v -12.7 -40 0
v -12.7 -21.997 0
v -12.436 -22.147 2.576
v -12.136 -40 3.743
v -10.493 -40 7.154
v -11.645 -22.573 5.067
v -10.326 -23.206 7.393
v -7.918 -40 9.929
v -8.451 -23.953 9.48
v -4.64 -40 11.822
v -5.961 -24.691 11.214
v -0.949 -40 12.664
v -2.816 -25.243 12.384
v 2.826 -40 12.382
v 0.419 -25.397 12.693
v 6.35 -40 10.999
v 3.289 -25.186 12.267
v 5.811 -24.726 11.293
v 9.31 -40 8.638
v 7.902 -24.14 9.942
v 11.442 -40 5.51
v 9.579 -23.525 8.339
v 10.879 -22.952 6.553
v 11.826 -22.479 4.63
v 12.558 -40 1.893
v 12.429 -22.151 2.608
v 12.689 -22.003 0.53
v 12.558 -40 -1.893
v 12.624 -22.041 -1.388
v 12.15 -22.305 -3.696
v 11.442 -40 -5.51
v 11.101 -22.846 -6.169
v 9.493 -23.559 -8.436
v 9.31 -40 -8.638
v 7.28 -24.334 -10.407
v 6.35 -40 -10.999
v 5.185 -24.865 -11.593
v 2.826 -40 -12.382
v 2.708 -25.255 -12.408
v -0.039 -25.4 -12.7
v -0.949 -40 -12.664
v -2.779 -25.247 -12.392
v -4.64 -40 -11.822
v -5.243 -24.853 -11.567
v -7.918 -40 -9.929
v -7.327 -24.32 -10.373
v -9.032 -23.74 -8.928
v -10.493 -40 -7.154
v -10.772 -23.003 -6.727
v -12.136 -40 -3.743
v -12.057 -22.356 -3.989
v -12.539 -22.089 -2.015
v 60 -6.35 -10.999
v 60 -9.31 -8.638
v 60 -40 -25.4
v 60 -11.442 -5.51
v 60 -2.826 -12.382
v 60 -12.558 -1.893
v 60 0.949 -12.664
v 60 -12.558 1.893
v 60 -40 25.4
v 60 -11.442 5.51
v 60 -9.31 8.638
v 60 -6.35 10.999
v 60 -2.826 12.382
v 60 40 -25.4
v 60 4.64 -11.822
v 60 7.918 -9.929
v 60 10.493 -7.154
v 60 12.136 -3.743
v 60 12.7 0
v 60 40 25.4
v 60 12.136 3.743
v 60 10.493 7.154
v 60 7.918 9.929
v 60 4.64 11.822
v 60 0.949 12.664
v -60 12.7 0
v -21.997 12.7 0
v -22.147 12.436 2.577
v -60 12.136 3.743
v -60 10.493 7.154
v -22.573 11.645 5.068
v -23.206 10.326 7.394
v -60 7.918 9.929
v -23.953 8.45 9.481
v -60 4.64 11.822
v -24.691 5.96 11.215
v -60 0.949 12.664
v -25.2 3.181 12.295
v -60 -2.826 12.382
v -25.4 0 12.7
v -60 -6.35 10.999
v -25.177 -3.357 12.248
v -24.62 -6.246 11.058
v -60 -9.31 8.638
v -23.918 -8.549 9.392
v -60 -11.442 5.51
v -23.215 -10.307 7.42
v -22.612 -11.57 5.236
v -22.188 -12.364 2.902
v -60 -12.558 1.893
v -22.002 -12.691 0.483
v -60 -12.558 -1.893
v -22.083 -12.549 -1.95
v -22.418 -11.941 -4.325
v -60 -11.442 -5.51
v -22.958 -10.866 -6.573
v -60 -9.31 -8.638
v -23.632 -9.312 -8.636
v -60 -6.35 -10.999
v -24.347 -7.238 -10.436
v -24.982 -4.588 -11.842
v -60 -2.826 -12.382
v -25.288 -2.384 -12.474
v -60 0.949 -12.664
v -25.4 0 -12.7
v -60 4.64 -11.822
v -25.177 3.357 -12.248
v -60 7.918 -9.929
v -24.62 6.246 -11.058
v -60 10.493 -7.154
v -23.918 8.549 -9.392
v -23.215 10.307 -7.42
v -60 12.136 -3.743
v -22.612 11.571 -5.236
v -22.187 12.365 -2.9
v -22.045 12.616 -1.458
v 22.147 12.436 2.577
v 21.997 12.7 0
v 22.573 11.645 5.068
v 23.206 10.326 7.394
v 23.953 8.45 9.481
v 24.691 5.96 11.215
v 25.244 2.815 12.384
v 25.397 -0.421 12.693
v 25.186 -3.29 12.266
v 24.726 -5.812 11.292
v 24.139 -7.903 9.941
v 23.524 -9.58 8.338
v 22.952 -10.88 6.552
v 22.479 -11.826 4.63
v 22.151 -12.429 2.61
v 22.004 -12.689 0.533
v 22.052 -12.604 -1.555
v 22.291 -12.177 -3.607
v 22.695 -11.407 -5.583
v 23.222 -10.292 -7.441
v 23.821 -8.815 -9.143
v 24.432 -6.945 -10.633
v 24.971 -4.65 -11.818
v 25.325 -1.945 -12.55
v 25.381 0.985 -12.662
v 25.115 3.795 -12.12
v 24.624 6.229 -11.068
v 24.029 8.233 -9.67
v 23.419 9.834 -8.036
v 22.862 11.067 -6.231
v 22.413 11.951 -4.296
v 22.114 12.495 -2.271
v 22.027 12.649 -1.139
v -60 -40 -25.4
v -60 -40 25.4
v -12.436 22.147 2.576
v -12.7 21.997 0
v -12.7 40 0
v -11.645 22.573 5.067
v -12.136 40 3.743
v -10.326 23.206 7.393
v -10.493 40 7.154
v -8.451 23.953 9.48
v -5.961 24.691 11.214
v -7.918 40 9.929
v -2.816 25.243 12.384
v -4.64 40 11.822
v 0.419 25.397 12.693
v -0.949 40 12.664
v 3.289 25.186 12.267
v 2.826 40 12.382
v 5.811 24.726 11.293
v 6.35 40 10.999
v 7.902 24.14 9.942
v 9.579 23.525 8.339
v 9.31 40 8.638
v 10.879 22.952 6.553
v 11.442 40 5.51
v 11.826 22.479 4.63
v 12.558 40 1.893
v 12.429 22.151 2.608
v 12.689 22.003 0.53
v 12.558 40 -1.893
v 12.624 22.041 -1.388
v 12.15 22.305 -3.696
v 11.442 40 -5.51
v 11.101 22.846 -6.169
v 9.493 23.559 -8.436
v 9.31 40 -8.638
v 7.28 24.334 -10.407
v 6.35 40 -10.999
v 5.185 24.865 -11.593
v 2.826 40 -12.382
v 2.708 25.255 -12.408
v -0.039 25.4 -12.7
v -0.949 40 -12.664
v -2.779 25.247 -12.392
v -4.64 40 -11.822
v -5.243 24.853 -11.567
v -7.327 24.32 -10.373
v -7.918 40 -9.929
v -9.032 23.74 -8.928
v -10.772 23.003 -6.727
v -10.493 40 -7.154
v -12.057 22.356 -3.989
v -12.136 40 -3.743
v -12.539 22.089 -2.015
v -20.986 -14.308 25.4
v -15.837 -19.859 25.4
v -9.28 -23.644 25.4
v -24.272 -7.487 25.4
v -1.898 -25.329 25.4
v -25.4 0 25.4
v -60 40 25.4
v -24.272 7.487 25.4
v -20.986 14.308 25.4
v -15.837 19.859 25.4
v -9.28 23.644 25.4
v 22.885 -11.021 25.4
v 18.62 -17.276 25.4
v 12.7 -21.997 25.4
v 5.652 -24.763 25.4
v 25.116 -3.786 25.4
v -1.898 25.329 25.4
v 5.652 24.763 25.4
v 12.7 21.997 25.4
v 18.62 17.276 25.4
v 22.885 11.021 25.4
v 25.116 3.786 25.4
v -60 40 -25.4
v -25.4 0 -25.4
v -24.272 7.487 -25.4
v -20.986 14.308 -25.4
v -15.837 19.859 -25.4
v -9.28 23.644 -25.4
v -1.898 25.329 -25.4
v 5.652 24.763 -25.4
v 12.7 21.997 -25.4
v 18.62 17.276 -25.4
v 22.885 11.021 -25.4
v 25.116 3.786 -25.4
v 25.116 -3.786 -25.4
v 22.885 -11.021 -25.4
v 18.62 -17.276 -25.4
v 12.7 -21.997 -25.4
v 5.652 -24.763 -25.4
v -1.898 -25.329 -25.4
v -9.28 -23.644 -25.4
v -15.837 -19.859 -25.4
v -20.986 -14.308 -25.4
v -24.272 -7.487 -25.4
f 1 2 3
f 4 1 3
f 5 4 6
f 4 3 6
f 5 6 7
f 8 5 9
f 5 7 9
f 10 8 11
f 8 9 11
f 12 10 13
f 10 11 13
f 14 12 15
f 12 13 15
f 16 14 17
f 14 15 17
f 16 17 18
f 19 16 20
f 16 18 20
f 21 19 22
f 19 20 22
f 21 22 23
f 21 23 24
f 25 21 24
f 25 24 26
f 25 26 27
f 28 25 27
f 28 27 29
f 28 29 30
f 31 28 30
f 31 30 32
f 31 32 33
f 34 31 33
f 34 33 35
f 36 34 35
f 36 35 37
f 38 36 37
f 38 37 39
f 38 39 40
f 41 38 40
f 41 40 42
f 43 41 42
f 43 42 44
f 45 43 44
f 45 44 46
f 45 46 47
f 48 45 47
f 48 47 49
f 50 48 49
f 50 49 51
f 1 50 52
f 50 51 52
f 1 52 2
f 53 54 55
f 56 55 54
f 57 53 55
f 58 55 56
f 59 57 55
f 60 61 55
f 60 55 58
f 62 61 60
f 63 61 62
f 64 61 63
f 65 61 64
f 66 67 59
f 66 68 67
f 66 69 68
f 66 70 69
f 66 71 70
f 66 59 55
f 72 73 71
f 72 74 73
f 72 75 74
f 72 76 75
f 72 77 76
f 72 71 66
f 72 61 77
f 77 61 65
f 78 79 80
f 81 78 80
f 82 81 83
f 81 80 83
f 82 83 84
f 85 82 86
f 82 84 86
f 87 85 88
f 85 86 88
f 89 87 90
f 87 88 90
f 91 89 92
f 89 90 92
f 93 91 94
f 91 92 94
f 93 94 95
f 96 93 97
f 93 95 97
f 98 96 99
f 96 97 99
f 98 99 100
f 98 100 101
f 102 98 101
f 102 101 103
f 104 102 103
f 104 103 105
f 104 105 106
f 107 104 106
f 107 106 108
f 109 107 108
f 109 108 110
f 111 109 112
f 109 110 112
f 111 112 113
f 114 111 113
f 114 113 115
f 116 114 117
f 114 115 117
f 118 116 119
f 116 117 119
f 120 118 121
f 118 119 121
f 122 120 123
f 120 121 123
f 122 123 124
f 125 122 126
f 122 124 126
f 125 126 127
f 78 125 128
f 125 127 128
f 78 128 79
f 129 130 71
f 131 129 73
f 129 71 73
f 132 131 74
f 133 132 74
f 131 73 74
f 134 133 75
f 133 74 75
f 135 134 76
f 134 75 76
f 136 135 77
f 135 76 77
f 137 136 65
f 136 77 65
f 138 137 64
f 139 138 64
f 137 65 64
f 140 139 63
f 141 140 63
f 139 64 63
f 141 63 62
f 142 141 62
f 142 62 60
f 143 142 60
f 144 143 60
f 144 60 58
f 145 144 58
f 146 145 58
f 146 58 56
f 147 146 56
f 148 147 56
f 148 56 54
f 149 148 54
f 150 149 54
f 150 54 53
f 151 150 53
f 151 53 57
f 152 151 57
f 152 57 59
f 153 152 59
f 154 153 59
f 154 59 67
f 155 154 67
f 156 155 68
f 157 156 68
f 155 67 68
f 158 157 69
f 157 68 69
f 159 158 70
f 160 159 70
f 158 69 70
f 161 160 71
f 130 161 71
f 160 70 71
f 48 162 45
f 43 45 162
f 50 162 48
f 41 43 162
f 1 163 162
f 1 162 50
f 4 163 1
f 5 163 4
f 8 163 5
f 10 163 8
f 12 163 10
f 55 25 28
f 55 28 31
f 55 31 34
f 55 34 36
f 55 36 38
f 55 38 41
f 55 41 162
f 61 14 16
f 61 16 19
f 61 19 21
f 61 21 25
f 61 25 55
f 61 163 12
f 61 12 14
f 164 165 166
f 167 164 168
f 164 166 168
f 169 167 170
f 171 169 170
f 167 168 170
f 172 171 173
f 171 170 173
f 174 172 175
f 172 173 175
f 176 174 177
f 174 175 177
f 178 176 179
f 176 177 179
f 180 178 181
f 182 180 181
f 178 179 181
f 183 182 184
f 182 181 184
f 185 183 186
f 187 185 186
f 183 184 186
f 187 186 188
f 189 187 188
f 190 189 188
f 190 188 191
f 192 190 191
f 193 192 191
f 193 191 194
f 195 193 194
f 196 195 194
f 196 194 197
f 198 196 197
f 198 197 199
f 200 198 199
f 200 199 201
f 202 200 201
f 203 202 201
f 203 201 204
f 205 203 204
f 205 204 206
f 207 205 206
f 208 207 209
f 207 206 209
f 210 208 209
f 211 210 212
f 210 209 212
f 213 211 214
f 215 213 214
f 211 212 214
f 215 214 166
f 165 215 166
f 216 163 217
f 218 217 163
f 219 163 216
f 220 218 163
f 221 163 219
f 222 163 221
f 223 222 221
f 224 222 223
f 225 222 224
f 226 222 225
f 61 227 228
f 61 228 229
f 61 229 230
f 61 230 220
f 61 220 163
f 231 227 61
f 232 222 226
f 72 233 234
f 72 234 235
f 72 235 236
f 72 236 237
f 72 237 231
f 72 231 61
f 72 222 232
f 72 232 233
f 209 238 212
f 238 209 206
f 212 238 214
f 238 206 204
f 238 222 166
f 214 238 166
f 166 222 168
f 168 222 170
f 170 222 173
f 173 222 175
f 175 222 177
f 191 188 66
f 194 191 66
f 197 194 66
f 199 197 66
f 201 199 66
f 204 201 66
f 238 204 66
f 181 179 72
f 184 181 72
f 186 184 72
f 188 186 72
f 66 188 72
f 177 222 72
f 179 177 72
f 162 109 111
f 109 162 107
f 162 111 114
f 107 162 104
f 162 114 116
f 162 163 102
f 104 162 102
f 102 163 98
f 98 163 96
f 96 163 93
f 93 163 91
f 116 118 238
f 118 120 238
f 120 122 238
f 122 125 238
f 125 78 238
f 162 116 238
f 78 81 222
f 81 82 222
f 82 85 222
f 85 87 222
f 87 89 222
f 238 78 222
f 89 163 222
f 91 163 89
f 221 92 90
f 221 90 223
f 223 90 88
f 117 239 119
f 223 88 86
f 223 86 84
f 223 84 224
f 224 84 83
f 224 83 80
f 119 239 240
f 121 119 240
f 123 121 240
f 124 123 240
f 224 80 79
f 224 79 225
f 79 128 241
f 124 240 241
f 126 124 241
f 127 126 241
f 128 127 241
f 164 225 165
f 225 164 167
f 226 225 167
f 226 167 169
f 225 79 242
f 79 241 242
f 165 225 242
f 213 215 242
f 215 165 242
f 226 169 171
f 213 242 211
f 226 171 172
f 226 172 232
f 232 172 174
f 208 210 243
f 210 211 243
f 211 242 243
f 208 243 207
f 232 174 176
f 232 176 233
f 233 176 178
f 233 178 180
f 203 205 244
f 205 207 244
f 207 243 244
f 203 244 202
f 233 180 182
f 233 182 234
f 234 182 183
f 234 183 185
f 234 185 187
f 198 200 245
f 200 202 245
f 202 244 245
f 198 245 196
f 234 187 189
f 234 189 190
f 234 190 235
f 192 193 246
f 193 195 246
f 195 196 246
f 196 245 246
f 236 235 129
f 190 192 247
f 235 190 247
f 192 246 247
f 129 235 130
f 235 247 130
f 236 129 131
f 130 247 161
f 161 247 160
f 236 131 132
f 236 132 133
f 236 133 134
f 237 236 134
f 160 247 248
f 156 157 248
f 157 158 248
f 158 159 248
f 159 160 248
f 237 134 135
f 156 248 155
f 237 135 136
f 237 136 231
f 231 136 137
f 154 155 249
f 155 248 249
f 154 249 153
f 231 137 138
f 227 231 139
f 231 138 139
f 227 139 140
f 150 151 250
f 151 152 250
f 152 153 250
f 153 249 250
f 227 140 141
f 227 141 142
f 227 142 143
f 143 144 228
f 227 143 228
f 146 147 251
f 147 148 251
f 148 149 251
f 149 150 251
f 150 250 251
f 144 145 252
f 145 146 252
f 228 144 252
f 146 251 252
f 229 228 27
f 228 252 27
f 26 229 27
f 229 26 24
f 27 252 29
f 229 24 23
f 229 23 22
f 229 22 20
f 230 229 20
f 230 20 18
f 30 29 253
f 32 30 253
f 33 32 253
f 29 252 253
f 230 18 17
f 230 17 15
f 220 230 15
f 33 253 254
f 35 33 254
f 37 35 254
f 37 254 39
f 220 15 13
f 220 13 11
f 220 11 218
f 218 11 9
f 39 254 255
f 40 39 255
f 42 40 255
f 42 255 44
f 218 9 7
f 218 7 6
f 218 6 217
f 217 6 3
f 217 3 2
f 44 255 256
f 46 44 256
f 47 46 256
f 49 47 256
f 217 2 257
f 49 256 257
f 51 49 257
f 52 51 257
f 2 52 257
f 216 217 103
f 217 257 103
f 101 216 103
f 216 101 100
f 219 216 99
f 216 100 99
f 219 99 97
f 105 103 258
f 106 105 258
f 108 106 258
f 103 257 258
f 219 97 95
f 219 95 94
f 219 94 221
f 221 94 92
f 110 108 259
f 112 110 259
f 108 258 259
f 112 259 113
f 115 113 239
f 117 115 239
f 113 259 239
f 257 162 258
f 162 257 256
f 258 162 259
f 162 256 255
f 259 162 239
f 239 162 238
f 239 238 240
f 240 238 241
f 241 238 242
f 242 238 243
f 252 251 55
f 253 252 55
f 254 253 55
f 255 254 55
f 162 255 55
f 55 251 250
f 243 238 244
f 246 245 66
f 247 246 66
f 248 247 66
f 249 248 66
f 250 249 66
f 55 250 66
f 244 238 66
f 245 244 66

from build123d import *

# Parameters (mm, degrees)
F0_W          = 120
F0_H          = 80
F1_DEPTH      = 25.4
F1_DEPTH_BACK = 25.4
F3_D          = 50.8
F5_D          = 25.4
F7_D          = 25.4


with BuildPart() as f1:
    # F0 (on Top) → F1 (new body, two sides)
    with BuildSketch(Plane.XY) as f1_sk:
        Rectangle(F0_W, F0_H)
    extrude(amount=F1_DEPTH)
    extrude(f1_sk.sketch, amount=-F1_DEPTH_BACK)

    # F3 (through all)
    with Locations(Plane.XY.offset(25.4)):
        with Locations((0, 0)):
            Hole(F3_D / 2)

    # F5 (through all)
    with Locations(Plane.XZ.offset(40)):
        with Locations((0, 0)):
            Hole(F5_D / 2)

    # F7 (through all)
    with Locations(Plane(origin=(-60, 0, 0), x_dir=(0, -1, 0), z_dir=(-1, 0, 0))):
        with Locations((0, 0)):
            Hole(F7_D / 2)


solid = f1.part
